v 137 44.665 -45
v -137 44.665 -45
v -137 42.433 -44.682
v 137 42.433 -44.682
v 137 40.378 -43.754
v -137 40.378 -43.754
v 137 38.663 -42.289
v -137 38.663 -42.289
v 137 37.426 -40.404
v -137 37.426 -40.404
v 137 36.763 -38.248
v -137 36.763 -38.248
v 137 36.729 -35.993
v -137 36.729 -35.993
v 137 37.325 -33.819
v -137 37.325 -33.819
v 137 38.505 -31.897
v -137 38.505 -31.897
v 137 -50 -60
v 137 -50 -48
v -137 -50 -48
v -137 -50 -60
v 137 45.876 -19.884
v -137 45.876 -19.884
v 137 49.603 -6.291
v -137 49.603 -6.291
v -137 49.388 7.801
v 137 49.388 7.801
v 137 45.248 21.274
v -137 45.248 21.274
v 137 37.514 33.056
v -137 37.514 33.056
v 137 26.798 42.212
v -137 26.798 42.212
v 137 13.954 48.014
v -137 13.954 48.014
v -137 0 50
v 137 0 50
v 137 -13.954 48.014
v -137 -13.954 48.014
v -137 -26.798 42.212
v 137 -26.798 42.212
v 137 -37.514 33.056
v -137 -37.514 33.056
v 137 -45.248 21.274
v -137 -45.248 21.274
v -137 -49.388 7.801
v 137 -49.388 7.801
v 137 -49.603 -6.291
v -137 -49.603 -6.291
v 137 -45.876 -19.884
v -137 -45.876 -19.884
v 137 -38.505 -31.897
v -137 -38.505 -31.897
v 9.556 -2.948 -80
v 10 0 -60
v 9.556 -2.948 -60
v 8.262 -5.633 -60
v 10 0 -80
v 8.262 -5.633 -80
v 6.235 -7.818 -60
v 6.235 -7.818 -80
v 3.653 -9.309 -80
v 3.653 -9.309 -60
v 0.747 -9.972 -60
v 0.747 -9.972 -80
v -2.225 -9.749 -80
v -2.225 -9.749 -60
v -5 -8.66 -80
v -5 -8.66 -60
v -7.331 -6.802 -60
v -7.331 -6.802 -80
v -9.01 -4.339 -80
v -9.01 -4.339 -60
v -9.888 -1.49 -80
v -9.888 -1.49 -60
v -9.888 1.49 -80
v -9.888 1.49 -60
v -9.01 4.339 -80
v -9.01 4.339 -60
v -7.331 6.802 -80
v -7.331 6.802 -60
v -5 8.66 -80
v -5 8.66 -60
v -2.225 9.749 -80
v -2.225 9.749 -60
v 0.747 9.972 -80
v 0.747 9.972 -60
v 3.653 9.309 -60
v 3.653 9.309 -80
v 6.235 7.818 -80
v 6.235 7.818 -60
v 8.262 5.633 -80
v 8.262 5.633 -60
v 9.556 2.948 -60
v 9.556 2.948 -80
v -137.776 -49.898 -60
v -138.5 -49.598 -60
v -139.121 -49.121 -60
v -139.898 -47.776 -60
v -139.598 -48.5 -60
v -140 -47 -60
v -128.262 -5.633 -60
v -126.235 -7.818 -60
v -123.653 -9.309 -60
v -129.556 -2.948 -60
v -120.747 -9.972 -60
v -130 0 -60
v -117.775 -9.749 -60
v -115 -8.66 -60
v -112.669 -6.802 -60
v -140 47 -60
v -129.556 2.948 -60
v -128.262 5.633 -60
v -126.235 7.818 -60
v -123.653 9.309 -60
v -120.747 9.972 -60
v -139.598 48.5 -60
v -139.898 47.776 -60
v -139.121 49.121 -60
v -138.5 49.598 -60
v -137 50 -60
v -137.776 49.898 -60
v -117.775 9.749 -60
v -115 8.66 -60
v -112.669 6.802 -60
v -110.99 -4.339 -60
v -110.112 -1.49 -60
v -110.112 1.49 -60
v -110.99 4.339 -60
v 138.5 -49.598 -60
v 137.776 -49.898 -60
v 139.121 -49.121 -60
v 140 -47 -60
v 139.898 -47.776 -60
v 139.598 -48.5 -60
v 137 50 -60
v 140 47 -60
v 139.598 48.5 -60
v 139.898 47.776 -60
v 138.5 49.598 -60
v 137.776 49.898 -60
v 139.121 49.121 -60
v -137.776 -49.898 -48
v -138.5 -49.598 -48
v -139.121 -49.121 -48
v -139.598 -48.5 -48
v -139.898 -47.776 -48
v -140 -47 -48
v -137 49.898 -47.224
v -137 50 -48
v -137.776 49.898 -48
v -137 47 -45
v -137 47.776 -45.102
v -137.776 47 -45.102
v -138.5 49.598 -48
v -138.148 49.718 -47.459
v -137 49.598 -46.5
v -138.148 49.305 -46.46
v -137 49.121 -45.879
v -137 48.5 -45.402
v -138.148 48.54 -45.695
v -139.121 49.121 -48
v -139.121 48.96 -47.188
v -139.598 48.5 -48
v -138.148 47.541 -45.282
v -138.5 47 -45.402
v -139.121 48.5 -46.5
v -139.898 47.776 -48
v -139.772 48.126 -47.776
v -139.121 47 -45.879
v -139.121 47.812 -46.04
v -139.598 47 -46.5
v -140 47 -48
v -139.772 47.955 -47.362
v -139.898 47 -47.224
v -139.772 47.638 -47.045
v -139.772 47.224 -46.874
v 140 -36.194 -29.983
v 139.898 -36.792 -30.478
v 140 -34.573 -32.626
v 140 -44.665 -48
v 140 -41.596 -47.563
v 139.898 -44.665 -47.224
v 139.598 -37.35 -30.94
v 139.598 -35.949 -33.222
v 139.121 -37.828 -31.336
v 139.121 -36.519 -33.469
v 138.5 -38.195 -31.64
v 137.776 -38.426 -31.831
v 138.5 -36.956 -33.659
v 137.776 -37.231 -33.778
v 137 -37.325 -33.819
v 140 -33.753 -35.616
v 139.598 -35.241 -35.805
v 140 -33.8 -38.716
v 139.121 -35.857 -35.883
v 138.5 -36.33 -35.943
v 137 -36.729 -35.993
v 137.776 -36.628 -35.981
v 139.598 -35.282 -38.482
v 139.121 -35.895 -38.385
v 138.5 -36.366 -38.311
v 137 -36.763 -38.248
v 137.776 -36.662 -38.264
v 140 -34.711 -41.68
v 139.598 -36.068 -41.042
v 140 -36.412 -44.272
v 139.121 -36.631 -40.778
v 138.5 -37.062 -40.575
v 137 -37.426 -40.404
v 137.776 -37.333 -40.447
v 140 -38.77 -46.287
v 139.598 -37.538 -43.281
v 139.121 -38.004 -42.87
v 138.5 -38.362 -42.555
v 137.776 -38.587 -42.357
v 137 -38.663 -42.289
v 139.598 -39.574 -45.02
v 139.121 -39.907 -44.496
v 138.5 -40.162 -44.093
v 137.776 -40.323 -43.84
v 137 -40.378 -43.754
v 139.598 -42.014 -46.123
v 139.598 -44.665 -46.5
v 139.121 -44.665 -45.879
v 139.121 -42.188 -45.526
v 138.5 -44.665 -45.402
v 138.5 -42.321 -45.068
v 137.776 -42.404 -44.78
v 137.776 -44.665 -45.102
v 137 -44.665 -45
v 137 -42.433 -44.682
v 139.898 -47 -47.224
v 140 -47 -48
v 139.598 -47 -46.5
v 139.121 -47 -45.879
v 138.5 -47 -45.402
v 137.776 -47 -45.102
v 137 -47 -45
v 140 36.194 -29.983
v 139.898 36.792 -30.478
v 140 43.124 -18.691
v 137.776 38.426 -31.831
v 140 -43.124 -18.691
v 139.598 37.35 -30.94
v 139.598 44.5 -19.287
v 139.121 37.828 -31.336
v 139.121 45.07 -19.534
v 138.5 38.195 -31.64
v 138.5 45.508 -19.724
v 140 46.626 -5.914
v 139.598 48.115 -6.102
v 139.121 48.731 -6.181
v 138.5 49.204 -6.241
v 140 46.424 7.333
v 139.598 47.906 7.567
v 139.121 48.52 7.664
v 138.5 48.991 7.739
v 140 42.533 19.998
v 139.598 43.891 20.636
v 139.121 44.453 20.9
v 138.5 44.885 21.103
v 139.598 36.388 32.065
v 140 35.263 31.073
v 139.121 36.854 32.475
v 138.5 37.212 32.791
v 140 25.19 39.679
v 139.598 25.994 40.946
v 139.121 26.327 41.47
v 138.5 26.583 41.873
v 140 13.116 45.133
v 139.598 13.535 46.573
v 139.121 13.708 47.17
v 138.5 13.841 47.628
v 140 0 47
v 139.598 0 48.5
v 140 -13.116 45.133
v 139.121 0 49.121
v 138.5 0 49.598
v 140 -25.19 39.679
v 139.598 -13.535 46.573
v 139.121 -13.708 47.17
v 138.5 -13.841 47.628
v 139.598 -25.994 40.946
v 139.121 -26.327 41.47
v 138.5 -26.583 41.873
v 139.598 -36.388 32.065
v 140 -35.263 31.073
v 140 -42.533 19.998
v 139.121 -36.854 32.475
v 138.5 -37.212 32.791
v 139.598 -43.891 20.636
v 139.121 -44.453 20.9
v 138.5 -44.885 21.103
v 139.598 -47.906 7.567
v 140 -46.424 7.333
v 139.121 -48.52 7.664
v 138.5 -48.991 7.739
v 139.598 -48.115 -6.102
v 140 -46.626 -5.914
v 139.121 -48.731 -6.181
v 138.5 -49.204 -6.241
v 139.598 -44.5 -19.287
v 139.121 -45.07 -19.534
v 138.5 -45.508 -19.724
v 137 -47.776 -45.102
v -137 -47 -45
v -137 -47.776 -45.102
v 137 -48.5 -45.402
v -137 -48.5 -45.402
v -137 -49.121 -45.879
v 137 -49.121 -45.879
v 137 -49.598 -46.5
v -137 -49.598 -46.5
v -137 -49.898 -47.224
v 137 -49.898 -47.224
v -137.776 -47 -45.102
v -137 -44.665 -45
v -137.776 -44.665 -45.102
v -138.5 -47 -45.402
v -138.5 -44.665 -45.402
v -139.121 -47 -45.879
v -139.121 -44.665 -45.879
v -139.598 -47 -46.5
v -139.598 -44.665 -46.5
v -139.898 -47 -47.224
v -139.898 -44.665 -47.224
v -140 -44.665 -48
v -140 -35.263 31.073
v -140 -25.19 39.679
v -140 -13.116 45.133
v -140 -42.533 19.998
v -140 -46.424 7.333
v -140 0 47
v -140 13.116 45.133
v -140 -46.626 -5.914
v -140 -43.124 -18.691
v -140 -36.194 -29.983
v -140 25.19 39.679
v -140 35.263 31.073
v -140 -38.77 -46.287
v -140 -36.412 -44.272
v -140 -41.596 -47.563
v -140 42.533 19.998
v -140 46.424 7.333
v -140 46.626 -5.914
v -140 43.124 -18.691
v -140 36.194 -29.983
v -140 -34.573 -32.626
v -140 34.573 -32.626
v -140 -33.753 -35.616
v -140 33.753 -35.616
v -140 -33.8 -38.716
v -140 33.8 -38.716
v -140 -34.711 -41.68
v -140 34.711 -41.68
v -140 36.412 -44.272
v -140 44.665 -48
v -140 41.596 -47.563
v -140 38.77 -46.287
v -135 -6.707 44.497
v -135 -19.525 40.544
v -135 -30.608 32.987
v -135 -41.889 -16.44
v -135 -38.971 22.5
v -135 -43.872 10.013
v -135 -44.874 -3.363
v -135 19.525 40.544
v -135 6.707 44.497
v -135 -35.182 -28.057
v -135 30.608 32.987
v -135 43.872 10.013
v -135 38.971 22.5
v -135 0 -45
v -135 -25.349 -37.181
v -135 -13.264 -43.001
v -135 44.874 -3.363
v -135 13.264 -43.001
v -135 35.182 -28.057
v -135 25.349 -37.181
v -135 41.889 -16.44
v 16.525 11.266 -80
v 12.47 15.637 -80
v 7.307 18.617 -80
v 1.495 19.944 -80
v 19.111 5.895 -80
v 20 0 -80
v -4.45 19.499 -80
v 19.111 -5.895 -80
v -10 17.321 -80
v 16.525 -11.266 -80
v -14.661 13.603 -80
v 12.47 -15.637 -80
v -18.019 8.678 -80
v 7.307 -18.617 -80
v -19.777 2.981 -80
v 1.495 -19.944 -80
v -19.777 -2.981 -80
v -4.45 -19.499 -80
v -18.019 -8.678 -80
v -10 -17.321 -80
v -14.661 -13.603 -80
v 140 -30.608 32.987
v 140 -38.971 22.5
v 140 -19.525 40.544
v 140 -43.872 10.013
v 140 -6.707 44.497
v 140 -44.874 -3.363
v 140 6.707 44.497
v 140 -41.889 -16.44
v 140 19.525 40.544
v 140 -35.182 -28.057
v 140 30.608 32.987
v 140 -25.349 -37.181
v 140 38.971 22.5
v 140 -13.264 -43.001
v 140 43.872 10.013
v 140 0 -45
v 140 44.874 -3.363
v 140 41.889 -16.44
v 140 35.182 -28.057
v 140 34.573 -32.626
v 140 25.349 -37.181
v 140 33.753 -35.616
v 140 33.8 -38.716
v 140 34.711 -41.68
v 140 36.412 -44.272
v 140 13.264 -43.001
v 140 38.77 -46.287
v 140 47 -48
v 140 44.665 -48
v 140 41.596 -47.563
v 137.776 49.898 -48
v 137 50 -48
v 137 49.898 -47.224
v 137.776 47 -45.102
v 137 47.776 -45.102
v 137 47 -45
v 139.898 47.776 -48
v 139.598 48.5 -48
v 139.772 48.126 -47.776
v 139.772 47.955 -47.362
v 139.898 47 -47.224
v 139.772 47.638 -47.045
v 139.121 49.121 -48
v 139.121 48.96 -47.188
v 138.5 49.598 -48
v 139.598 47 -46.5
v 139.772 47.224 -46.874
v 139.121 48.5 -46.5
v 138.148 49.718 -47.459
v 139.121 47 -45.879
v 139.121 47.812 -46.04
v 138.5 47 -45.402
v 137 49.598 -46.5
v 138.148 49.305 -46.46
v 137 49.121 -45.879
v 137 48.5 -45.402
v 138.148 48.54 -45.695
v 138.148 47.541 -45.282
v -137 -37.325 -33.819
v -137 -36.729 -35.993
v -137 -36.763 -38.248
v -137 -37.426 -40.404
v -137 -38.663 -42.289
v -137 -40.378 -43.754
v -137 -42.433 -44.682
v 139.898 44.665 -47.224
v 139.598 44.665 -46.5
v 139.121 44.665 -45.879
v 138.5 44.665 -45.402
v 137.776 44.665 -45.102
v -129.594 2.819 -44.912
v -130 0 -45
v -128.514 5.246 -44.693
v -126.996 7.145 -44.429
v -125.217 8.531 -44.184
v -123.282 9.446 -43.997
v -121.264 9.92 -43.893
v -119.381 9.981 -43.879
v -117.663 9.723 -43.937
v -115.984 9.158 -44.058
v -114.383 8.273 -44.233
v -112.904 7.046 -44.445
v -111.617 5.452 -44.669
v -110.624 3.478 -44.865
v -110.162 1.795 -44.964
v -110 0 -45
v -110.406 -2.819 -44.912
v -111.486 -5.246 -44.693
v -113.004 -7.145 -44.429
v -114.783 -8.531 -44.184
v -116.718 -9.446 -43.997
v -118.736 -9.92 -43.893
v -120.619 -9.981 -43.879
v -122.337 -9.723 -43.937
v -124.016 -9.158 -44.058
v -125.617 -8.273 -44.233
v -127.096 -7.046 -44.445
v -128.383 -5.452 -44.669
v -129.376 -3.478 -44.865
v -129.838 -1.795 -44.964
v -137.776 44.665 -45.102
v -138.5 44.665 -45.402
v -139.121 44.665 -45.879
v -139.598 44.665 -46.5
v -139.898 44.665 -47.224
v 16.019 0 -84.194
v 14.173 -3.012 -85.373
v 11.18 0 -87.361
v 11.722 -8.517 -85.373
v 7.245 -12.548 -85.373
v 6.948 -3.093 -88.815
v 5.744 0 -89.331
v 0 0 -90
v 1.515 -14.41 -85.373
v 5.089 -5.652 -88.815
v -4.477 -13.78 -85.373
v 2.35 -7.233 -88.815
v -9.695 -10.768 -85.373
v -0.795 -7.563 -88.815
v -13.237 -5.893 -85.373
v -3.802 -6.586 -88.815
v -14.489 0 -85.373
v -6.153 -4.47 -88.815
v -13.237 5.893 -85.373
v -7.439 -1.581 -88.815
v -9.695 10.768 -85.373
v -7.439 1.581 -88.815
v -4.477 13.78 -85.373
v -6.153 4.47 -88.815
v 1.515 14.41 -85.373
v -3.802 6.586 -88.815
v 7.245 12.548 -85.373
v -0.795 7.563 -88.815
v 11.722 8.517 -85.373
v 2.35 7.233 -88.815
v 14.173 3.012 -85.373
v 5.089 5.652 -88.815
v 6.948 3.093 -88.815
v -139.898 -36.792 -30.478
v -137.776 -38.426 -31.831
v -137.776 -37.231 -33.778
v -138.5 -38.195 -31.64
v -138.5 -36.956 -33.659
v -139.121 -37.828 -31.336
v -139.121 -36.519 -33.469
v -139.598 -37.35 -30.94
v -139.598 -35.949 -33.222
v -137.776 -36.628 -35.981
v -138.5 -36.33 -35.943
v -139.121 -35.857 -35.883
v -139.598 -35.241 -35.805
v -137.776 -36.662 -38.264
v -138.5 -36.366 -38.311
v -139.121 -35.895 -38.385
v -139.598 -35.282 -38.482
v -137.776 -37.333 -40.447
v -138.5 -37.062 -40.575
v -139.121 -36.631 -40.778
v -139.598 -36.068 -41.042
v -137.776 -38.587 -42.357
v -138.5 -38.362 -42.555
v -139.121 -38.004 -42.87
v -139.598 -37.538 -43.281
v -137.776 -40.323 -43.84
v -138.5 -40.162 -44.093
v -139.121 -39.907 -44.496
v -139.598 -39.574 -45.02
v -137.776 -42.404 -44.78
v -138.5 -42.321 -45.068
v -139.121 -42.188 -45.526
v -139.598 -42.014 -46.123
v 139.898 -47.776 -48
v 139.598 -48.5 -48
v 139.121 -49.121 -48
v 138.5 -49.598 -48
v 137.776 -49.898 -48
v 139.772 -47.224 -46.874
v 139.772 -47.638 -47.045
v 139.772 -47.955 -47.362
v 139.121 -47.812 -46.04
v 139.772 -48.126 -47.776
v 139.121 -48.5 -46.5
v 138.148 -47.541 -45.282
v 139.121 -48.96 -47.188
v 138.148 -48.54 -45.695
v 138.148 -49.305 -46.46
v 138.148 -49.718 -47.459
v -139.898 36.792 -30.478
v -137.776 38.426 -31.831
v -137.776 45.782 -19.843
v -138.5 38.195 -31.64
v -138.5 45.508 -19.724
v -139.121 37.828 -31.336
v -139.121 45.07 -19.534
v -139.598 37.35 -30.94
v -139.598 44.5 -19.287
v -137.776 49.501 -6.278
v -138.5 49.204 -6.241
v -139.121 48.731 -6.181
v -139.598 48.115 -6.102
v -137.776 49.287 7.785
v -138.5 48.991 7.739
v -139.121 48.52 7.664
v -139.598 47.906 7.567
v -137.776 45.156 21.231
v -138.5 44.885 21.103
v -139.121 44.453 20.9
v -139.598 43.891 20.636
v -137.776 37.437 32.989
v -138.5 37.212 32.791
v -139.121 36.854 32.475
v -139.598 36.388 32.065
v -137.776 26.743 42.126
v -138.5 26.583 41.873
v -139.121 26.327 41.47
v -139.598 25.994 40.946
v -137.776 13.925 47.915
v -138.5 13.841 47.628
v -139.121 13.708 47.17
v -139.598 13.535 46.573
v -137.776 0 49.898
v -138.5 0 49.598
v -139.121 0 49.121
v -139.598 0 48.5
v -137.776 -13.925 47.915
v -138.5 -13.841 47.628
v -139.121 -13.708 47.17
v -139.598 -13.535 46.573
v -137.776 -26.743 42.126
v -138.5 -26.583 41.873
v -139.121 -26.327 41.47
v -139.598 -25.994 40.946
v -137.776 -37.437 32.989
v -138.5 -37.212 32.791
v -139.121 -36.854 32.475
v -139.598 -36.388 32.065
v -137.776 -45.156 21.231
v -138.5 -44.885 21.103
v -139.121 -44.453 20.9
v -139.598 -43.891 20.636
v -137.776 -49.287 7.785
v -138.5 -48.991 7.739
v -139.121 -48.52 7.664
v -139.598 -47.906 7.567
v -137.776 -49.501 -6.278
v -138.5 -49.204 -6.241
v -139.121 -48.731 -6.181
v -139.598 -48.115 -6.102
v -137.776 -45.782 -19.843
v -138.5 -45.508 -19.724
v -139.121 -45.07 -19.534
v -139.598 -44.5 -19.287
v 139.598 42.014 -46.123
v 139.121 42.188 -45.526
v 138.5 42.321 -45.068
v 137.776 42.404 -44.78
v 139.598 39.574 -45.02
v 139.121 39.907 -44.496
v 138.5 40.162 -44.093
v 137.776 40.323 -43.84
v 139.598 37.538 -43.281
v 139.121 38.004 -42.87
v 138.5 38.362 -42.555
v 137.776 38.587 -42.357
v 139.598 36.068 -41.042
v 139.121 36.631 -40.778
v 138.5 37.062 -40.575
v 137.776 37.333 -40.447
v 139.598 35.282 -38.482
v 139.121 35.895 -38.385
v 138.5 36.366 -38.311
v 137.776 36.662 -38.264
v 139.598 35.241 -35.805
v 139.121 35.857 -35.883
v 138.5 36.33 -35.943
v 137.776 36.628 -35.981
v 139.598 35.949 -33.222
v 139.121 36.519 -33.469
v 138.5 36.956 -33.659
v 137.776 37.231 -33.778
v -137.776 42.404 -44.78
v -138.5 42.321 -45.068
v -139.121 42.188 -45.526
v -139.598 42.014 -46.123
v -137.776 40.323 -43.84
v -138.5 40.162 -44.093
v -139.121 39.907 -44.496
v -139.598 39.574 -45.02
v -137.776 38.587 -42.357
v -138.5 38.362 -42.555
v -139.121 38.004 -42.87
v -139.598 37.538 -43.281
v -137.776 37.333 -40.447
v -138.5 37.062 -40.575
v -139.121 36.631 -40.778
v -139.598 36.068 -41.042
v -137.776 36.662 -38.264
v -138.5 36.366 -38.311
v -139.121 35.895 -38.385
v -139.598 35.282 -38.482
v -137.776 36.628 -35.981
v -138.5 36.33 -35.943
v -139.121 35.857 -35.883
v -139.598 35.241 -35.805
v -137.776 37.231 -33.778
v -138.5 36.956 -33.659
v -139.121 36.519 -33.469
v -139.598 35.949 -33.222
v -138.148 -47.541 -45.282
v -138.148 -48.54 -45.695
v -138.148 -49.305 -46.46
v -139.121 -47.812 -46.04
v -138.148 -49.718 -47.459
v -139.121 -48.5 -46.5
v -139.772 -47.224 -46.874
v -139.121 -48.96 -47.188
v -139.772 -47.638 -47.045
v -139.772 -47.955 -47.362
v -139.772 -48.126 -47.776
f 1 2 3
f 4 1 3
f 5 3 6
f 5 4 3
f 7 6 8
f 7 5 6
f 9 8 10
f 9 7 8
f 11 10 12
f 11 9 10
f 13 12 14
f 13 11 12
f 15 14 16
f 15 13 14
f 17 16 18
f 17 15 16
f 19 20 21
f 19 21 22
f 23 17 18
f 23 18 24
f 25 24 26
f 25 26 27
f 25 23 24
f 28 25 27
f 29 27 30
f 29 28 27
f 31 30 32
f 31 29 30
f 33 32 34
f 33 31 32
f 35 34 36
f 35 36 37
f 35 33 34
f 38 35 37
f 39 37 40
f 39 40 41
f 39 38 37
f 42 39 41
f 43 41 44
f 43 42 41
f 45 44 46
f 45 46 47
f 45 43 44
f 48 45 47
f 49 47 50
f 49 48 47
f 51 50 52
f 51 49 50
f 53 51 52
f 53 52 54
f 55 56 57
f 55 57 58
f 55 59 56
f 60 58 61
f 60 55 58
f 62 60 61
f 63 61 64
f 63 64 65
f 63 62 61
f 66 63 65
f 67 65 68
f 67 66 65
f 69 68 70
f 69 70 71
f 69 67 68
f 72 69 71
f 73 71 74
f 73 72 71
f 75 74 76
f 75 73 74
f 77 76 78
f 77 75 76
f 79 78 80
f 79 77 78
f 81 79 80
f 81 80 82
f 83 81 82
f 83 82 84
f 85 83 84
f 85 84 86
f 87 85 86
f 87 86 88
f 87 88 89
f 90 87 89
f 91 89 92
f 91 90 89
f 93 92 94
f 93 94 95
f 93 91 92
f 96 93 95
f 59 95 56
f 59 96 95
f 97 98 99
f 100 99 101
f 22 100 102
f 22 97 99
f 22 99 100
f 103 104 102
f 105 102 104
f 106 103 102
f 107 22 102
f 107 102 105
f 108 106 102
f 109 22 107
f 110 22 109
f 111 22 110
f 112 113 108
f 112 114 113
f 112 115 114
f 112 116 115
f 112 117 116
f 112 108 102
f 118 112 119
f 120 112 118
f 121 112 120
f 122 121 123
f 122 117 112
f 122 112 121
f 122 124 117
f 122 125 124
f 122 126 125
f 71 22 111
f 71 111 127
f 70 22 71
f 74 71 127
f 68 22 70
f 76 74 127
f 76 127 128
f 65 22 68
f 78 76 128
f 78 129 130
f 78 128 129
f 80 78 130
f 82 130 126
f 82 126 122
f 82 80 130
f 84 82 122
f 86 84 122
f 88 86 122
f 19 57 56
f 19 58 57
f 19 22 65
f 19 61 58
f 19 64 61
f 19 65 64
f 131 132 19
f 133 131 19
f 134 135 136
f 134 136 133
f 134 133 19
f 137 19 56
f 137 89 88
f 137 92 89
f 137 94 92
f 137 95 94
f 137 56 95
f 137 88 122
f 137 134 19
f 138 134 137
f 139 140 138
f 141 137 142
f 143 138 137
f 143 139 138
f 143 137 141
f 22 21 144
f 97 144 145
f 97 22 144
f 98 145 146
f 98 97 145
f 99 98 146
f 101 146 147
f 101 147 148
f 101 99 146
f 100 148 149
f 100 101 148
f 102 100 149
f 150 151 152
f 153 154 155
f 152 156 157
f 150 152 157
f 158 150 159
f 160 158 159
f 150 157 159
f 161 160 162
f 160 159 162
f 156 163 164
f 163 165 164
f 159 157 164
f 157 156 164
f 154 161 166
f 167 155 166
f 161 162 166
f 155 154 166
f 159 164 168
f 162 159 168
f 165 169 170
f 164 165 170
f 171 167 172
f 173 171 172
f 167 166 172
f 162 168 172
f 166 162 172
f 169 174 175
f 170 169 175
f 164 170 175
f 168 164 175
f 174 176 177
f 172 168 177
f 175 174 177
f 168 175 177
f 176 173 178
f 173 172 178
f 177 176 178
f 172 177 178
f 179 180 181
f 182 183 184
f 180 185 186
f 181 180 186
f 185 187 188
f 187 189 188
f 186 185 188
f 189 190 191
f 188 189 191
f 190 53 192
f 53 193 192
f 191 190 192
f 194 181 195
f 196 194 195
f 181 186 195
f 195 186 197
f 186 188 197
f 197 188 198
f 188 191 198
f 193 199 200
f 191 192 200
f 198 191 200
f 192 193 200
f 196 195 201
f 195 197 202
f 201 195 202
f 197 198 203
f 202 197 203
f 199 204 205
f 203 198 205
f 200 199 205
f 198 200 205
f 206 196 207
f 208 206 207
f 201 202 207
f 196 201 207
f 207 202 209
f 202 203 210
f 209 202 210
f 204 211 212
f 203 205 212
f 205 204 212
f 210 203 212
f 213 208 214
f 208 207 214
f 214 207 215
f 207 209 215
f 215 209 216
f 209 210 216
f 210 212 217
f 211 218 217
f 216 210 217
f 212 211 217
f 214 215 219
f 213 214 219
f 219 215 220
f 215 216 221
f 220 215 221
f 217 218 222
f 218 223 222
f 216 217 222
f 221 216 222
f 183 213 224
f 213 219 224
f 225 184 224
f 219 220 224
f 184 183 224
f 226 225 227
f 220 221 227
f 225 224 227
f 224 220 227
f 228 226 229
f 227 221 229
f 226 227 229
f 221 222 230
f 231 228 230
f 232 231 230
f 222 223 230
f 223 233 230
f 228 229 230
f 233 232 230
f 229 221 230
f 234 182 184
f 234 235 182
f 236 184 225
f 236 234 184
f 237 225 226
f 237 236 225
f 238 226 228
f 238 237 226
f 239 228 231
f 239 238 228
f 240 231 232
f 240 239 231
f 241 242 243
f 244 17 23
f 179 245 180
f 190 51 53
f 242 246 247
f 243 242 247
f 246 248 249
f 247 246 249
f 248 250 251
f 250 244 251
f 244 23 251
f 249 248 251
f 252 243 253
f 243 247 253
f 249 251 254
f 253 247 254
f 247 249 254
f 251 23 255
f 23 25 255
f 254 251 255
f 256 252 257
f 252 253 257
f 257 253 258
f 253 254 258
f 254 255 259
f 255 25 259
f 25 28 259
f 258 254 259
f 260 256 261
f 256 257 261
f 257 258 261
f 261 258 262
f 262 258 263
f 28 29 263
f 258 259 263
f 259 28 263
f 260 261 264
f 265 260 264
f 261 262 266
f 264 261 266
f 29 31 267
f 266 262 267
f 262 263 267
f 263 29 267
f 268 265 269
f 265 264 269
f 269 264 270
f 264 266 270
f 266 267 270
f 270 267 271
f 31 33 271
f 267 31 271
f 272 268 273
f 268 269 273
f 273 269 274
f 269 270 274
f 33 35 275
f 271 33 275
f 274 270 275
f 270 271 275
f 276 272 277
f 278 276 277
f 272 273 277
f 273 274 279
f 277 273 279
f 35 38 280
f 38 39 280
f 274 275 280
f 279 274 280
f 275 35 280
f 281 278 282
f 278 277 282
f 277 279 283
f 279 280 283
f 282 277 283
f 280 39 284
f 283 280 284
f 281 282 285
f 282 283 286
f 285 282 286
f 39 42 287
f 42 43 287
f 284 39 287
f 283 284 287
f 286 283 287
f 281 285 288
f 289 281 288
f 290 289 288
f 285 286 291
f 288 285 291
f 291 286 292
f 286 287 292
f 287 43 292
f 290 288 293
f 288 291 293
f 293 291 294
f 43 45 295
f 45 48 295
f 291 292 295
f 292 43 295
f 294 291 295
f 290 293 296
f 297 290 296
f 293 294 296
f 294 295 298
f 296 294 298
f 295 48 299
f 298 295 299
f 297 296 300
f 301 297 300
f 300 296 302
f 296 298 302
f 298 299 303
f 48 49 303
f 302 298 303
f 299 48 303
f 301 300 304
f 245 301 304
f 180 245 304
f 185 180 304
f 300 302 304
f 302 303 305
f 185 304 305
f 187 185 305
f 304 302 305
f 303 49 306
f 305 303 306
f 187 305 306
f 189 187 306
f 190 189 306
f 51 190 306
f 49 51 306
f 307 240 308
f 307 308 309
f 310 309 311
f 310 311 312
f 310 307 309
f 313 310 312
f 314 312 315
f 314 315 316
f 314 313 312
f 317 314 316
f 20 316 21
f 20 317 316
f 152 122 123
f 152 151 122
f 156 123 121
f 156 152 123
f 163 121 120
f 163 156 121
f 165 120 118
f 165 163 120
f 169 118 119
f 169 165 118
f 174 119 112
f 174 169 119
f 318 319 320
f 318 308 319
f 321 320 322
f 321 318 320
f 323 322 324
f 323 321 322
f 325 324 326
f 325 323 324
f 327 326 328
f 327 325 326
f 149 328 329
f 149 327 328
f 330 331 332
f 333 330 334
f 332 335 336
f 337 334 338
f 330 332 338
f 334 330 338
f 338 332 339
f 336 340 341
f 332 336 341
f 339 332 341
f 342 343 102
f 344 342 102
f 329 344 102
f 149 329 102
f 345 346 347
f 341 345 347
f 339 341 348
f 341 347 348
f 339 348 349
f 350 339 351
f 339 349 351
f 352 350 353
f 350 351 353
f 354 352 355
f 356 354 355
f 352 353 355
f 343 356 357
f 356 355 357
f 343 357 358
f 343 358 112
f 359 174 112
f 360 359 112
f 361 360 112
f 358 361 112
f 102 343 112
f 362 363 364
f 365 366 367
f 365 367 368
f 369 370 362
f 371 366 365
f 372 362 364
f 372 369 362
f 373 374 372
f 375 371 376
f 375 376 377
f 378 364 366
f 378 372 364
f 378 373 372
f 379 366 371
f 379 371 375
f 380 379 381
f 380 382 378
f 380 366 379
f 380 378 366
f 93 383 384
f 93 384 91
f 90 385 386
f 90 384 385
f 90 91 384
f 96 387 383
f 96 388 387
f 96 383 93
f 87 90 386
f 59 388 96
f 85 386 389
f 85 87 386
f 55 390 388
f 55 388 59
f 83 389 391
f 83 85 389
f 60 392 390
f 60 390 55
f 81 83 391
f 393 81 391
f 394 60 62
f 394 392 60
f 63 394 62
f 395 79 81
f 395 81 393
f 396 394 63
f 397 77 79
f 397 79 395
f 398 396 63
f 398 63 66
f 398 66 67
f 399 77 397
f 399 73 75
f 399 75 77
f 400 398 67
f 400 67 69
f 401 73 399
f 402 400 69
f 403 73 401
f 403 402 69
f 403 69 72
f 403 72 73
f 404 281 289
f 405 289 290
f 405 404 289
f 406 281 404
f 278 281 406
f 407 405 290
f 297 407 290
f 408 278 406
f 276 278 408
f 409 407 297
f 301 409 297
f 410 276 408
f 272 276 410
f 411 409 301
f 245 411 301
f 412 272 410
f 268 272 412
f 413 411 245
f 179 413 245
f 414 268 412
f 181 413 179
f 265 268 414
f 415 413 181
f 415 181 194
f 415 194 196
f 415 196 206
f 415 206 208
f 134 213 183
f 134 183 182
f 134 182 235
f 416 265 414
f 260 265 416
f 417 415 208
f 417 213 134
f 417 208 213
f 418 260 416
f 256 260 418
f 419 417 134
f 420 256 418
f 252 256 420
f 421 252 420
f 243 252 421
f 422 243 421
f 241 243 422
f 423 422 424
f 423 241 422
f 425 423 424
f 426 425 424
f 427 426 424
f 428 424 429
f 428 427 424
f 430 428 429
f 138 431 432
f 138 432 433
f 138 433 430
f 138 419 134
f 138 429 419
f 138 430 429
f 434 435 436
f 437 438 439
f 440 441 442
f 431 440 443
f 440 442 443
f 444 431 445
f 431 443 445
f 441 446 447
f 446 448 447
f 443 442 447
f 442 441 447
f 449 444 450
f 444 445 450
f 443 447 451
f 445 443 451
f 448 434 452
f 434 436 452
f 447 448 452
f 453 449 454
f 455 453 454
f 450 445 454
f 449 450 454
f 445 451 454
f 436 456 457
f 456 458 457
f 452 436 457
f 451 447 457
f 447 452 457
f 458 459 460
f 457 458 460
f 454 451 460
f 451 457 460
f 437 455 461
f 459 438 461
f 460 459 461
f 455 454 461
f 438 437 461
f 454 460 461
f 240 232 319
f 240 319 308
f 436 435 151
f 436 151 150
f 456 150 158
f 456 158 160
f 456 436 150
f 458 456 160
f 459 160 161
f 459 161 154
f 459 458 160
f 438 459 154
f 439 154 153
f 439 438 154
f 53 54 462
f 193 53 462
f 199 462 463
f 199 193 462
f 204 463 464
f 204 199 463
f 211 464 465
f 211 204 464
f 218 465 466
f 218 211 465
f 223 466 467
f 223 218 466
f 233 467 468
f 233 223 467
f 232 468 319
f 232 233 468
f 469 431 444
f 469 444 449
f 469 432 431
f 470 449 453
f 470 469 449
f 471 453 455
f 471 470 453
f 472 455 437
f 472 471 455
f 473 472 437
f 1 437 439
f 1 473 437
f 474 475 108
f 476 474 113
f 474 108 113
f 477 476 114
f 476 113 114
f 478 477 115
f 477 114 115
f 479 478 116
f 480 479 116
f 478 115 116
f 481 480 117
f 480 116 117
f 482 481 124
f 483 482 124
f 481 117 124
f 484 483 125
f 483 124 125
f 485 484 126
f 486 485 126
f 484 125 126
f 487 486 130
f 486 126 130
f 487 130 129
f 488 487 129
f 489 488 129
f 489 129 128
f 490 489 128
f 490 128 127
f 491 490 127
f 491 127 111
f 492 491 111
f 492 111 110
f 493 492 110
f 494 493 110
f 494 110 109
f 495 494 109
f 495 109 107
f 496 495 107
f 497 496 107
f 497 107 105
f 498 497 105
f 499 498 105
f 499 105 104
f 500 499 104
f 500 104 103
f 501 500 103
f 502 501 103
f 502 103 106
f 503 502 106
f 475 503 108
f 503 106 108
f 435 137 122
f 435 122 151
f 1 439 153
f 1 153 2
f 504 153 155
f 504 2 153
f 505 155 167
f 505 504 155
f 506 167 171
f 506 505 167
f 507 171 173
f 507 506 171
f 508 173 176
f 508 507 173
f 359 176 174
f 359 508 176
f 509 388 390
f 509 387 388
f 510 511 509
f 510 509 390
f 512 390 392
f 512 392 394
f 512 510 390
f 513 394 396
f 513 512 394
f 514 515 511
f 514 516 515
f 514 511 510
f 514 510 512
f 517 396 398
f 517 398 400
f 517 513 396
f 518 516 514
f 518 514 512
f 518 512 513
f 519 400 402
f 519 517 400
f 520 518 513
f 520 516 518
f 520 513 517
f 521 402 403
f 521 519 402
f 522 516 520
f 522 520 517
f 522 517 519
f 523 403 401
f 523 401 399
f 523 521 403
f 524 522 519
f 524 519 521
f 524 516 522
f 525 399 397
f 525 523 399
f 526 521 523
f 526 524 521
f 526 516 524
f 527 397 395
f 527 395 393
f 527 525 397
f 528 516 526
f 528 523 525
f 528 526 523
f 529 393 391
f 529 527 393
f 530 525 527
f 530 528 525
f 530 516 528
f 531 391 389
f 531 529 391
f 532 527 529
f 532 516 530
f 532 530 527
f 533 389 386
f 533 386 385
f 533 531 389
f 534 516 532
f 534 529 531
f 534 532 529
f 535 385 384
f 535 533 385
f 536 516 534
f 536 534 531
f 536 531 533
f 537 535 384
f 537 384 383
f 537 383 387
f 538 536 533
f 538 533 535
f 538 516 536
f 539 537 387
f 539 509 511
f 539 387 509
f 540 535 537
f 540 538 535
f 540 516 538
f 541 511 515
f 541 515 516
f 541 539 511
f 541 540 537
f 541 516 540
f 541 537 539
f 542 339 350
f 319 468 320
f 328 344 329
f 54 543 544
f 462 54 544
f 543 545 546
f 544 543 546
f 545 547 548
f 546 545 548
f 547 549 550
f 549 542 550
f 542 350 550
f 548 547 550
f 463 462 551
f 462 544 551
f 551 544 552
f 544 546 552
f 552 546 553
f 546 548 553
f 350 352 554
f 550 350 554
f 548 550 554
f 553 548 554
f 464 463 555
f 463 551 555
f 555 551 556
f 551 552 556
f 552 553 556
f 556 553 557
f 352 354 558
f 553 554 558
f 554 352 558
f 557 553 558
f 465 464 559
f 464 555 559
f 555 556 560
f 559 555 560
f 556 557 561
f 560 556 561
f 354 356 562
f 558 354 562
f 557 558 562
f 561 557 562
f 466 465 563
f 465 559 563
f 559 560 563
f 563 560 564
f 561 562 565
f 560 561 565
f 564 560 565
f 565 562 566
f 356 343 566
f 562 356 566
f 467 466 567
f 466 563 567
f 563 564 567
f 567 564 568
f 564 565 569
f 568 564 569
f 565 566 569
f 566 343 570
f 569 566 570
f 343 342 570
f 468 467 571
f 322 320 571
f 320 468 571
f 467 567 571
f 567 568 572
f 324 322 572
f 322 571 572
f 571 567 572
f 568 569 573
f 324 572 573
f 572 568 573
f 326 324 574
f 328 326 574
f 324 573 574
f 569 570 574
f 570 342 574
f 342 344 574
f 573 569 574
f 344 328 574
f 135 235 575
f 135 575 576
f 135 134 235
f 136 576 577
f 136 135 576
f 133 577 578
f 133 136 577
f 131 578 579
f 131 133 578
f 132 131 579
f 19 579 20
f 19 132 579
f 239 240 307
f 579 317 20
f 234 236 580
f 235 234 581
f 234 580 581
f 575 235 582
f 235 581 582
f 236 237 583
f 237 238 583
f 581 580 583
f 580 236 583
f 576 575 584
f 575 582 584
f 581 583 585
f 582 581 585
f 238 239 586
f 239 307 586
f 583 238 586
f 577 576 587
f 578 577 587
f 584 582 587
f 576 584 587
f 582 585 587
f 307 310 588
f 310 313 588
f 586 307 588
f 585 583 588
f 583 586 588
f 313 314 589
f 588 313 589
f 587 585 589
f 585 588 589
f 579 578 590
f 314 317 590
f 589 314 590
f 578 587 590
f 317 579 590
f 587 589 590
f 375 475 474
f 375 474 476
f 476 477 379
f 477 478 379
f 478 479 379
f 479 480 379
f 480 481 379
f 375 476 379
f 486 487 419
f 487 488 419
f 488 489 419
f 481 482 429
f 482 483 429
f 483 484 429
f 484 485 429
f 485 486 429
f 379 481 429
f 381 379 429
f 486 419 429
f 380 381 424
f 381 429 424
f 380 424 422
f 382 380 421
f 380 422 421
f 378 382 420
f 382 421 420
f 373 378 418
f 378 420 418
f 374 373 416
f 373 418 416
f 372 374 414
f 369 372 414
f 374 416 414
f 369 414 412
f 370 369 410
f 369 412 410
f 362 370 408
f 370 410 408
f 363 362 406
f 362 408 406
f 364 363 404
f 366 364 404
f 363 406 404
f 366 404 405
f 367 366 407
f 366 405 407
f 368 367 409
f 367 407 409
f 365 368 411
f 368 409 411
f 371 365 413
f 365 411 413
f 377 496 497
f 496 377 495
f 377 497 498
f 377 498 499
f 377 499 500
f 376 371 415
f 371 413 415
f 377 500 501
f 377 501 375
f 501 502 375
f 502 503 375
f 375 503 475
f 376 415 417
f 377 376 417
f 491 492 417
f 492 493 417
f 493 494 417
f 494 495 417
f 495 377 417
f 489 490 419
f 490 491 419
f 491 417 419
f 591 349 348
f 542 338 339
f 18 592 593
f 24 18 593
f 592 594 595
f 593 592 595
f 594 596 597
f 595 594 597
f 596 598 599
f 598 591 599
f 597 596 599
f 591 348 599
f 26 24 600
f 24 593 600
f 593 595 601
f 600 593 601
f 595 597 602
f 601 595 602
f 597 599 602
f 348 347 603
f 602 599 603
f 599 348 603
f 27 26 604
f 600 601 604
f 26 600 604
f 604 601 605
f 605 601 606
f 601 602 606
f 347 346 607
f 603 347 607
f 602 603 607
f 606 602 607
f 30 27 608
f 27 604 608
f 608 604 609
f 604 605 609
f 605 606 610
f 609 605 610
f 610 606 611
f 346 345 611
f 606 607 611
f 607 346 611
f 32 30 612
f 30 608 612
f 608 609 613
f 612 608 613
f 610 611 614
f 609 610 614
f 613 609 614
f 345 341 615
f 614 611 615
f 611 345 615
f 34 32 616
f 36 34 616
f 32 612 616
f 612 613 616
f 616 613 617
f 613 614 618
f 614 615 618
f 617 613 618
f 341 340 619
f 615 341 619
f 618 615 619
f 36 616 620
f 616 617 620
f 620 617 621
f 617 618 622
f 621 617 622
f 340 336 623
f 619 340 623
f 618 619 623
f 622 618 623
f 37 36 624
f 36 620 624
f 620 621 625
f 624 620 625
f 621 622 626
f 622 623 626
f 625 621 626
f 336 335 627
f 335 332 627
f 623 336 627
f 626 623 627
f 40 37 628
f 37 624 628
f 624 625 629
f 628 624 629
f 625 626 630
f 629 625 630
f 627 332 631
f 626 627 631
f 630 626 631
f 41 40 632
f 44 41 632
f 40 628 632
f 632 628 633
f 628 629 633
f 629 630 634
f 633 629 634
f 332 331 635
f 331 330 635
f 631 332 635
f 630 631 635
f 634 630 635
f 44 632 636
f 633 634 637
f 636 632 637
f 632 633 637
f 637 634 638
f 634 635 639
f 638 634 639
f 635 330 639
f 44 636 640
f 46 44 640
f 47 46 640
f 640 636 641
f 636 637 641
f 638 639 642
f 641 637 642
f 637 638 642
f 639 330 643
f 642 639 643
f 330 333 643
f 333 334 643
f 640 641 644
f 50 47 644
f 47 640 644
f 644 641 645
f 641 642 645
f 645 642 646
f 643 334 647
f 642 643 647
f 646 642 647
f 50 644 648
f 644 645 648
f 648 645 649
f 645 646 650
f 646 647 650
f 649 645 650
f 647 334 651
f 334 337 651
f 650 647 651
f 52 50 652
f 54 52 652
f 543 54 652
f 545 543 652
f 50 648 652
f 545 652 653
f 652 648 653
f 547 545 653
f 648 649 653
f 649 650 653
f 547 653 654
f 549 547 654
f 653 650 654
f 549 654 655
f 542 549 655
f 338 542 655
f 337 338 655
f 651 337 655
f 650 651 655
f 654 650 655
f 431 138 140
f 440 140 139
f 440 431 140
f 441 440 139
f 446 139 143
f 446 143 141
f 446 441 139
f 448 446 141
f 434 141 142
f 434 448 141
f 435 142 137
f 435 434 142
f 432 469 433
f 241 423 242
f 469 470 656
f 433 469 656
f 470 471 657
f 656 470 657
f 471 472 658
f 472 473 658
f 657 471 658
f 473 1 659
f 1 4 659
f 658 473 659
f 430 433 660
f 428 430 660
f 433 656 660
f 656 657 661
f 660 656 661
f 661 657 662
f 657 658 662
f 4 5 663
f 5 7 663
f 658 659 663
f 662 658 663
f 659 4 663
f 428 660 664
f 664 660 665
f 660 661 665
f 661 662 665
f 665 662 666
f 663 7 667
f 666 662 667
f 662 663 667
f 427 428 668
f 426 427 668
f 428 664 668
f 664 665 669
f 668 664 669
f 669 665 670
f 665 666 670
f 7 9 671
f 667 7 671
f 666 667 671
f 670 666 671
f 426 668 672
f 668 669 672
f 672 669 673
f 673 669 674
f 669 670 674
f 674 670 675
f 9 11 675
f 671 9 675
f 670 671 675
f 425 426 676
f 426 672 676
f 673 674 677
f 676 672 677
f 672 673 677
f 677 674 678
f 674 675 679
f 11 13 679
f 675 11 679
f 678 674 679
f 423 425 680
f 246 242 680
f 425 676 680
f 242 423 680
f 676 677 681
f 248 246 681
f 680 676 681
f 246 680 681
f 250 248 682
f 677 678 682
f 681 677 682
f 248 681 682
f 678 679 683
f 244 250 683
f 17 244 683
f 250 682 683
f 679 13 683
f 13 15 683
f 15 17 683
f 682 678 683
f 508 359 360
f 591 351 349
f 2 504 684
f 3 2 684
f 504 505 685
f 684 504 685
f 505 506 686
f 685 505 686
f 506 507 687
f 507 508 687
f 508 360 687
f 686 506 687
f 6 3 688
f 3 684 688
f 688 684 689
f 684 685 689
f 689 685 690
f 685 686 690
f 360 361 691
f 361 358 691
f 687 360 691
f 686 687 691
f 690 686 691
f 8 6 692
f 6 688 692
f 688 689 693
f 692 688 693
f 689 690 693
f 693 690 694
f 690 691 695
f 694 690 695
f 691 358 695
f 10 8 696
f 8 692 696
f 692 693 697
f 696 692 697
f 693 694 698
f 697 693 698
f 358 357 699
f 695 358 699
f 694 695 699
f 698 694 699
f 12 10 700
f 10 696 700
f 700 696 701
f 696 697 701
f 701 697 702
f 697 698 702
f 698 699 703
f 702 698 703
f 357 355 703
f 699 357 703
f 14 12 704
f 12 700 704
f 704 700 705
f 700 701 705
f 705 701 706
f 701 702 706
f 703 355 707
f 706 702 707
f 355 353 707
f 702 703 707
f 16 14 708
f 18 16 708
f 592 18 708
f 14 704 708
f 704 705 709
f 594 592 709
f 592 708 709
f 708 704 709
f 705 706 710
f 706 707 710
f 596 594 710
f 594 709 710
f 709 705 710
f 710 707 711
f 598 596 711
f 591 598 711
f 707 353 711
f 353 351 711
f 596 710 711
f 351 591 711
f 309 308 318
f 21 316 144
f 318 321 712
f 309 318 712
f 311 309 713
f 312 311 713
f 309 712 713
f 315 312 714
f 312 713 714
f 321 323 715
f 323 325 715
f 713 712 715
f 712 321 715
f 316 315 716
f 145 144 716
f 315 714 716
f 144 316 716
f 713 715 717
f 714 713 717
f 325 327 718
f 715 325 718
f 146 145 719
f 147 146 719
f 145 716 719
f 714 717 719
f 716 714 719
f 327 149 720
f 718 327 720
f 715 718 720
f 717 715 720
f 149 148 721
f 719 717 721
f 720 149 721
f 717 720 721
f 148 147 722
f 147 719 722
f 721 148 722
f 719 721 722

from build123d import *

# Parameters (mm, degrees)
EXTRUDE_1_DEPTH     = 140
FILLET_1_R          = 3
SKETCH_3_R          = 45
CUT_EXTRUDE_1_DEPTH = 275
SKETCH_4_R          = 10
CUT_EXTRUDE_2_DEPTH = 30


with BuildPart() as part:
    # Эскиз1 → Бобышка-Вытянуть1 (new, symmetric)
    with BuildSketch(Plane(origin=(0, 0, 0), x_dir=(0, 0, -1), z_dir=(1, 0, 0))):
        with BuildLine():
            Line((60, -50), (60, 50))
            Line((60, 50), (48, 50))
            ThreePointArc((48, 50), (45.878679656, 49.121320344), (45, 47))
            Line((45, 47), (45, 44.665422868))
            ThreePointArc((45, 44.665422868), (40.403851774, 37.42568578), (31.896551724, 38.504674886))
            ThreePointArc((31.896551724, 38.504674886), (-50, 0), (31.896551724, -38.504674886))
            ThreePointArc((31.896551724, -38.504674886), (40.403851774, -37.42568578), (45, -44.665422868))
            Line((45, -44.665422868), (45, -47))
            ThreePointArc((45, -47), (45.878679656, -49.121320344), (48, -50))
            Line((48, -50), (60, -50))
        make_face()
    extrude(amount=EXTRUDE_1_DEPTH, both=True)

    # Скругление1
    fillet_1_edges = [part.edges().sort_by_distance(p)[0] for p in [
        (-140, 0, 50),
        (-140, 37.42568578, -40.403851774),
        (-140, 45.832711434, -45),
        (-140, 49.121320344, -45.878679656),
        (-140, 50, -54),
        (-140, -50, -54),
        (-140, -49.121320344, -45.878679656),
        (140, 50, -54),
        (140, 49.121320344, -45.878679656),
        (140, 45.832711434, -45),
        (140, 37.42568578, -40.403851774),
        (140, 0, 50),
        (140, -37.42568578, -40.403851774),
        (140, -45.832711434, -45),
        (140, -49.121320344, -45.878679656),
        (140, -50, -54),
        (-140, -45.832711434, -45),
        (-140, -37.42568578, -40.403851774),
    ]]
    fillet(fillet_1_edges, radius=FILLET_1_R)

    # Эскиз2 → Повернуть1 (revolve)
    with BuildSketch(Plane(origin=(0, 0, 0), x_dir=(0, 0, -1), z_dir=(1, 0, 0)), mode=Mode.PRIVATE) as revolve_1_sk:
        with BuildLine():
            Line((60, 0), (60, 10))
            Line((60, 10), (80, 10))
            Line((80, 10), (80, 20))
            ThreePointArc((80, 20), (87.360679775, 11.180339887), (90, 0))
            Line((90, 0), (60, 0))
        make_face()
    revolve(revolve_1_sk.sketch.rotate(Axis((0, 0, 60.403427692), (0, 0, -1)), 90), axis=Axis((0, 0, 60.403427692), (0, 0, -1)))

    # Эскиз3 → Вырез-Вытянуть1 (cut)
    with BuildSketch(Plane(origin=(140, 0, 0), x_dir=(0, 0, -1), z_dir=(1, 0, 0))):
        Circle(SKETCH_3_R)
    extrude(amount=-CUT_EXTRUDE_1_DEPTH, mode=Mode.SUBTRACT)

    # Эскиз4 → Вырез-Вытянуть2 (cut)
    with BuildSketch(Plane(origin=(0, 0, -60), x_dir=(-1, 0, 0), z_dir=(0, 0, -1))):
        with Locations((120, 0)):
            Circle(SKETCH_4_R)
    extrude(amount=-CUT_EXTRUDE_2_DEPTH, mode=Mode.SUBTRACT)


solid = part.part
